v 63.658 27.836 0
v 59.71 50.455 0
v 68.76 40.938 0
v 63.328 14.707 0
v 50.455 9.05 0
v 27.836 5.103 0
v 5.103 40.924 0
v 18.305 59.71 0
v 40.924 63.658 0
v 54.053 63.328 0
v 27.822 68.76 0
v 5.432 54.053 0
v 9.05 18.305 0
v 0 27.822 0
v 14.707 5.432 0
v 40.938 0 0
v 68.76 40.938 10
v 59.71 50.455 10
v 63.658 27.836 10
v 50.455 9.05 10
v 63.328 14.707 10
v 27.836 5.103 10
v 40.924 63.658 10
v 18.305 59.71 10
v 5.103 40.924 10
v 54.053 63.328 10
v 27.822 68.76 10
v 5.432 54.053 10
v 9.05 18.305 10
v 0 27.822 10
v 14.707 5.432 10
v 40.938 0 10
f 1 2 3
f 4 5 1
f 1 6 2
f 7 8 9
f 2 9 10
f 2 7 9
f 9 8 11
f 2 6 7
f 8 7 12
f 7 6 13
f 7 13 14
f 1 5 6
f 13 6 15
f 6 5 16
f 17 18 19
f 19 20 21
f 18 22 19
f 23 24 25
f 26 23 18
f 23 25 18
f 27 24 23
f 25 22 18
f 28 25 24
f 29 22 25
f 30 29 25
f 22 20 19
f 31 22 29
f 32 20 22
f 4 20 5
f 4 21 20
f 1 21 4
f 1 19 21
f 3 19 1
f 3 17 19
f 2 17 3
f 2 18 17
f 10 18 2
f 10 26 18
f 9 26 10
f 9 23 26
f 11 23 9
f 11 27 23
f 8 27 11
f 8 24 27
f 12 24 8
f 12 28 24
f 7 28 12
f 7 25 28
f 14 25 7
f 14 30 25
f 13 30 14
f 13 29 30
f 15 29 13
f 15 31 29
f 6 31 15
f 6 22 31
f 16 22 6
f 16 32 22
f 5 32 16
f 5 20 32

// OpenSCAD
$fn = 32;

// ----------------------------------------------------------------------
// Chain sprocket: 8 teeth, 30 mm root radius
// ----------------------------------------------------------------------

// --- parameters (mm) ---
profile_height = 10;      // extrusion height
profile_points = 16;      // points of the closed outline

profile = [[63.658, 27.836], [68.76, 40.938], [59.71, 50.455], [54.053, 63.328], [40.924, 63.658], [27.822, 68.76], [18.305, 59.71], [5.432, 54.053], [5.103, 40.924], [0, 27.822], [9.05, 18.305], [14.707, 5.432], [27.836, 5.103], [40.938, 0], [50.455, 9.05], [63.328, 14.707]];  // single closed polygon, 16 points, counter clockwise

// --- the one profile operation ---
linear_extrude(height = profile_height) polygon(points = profile);
